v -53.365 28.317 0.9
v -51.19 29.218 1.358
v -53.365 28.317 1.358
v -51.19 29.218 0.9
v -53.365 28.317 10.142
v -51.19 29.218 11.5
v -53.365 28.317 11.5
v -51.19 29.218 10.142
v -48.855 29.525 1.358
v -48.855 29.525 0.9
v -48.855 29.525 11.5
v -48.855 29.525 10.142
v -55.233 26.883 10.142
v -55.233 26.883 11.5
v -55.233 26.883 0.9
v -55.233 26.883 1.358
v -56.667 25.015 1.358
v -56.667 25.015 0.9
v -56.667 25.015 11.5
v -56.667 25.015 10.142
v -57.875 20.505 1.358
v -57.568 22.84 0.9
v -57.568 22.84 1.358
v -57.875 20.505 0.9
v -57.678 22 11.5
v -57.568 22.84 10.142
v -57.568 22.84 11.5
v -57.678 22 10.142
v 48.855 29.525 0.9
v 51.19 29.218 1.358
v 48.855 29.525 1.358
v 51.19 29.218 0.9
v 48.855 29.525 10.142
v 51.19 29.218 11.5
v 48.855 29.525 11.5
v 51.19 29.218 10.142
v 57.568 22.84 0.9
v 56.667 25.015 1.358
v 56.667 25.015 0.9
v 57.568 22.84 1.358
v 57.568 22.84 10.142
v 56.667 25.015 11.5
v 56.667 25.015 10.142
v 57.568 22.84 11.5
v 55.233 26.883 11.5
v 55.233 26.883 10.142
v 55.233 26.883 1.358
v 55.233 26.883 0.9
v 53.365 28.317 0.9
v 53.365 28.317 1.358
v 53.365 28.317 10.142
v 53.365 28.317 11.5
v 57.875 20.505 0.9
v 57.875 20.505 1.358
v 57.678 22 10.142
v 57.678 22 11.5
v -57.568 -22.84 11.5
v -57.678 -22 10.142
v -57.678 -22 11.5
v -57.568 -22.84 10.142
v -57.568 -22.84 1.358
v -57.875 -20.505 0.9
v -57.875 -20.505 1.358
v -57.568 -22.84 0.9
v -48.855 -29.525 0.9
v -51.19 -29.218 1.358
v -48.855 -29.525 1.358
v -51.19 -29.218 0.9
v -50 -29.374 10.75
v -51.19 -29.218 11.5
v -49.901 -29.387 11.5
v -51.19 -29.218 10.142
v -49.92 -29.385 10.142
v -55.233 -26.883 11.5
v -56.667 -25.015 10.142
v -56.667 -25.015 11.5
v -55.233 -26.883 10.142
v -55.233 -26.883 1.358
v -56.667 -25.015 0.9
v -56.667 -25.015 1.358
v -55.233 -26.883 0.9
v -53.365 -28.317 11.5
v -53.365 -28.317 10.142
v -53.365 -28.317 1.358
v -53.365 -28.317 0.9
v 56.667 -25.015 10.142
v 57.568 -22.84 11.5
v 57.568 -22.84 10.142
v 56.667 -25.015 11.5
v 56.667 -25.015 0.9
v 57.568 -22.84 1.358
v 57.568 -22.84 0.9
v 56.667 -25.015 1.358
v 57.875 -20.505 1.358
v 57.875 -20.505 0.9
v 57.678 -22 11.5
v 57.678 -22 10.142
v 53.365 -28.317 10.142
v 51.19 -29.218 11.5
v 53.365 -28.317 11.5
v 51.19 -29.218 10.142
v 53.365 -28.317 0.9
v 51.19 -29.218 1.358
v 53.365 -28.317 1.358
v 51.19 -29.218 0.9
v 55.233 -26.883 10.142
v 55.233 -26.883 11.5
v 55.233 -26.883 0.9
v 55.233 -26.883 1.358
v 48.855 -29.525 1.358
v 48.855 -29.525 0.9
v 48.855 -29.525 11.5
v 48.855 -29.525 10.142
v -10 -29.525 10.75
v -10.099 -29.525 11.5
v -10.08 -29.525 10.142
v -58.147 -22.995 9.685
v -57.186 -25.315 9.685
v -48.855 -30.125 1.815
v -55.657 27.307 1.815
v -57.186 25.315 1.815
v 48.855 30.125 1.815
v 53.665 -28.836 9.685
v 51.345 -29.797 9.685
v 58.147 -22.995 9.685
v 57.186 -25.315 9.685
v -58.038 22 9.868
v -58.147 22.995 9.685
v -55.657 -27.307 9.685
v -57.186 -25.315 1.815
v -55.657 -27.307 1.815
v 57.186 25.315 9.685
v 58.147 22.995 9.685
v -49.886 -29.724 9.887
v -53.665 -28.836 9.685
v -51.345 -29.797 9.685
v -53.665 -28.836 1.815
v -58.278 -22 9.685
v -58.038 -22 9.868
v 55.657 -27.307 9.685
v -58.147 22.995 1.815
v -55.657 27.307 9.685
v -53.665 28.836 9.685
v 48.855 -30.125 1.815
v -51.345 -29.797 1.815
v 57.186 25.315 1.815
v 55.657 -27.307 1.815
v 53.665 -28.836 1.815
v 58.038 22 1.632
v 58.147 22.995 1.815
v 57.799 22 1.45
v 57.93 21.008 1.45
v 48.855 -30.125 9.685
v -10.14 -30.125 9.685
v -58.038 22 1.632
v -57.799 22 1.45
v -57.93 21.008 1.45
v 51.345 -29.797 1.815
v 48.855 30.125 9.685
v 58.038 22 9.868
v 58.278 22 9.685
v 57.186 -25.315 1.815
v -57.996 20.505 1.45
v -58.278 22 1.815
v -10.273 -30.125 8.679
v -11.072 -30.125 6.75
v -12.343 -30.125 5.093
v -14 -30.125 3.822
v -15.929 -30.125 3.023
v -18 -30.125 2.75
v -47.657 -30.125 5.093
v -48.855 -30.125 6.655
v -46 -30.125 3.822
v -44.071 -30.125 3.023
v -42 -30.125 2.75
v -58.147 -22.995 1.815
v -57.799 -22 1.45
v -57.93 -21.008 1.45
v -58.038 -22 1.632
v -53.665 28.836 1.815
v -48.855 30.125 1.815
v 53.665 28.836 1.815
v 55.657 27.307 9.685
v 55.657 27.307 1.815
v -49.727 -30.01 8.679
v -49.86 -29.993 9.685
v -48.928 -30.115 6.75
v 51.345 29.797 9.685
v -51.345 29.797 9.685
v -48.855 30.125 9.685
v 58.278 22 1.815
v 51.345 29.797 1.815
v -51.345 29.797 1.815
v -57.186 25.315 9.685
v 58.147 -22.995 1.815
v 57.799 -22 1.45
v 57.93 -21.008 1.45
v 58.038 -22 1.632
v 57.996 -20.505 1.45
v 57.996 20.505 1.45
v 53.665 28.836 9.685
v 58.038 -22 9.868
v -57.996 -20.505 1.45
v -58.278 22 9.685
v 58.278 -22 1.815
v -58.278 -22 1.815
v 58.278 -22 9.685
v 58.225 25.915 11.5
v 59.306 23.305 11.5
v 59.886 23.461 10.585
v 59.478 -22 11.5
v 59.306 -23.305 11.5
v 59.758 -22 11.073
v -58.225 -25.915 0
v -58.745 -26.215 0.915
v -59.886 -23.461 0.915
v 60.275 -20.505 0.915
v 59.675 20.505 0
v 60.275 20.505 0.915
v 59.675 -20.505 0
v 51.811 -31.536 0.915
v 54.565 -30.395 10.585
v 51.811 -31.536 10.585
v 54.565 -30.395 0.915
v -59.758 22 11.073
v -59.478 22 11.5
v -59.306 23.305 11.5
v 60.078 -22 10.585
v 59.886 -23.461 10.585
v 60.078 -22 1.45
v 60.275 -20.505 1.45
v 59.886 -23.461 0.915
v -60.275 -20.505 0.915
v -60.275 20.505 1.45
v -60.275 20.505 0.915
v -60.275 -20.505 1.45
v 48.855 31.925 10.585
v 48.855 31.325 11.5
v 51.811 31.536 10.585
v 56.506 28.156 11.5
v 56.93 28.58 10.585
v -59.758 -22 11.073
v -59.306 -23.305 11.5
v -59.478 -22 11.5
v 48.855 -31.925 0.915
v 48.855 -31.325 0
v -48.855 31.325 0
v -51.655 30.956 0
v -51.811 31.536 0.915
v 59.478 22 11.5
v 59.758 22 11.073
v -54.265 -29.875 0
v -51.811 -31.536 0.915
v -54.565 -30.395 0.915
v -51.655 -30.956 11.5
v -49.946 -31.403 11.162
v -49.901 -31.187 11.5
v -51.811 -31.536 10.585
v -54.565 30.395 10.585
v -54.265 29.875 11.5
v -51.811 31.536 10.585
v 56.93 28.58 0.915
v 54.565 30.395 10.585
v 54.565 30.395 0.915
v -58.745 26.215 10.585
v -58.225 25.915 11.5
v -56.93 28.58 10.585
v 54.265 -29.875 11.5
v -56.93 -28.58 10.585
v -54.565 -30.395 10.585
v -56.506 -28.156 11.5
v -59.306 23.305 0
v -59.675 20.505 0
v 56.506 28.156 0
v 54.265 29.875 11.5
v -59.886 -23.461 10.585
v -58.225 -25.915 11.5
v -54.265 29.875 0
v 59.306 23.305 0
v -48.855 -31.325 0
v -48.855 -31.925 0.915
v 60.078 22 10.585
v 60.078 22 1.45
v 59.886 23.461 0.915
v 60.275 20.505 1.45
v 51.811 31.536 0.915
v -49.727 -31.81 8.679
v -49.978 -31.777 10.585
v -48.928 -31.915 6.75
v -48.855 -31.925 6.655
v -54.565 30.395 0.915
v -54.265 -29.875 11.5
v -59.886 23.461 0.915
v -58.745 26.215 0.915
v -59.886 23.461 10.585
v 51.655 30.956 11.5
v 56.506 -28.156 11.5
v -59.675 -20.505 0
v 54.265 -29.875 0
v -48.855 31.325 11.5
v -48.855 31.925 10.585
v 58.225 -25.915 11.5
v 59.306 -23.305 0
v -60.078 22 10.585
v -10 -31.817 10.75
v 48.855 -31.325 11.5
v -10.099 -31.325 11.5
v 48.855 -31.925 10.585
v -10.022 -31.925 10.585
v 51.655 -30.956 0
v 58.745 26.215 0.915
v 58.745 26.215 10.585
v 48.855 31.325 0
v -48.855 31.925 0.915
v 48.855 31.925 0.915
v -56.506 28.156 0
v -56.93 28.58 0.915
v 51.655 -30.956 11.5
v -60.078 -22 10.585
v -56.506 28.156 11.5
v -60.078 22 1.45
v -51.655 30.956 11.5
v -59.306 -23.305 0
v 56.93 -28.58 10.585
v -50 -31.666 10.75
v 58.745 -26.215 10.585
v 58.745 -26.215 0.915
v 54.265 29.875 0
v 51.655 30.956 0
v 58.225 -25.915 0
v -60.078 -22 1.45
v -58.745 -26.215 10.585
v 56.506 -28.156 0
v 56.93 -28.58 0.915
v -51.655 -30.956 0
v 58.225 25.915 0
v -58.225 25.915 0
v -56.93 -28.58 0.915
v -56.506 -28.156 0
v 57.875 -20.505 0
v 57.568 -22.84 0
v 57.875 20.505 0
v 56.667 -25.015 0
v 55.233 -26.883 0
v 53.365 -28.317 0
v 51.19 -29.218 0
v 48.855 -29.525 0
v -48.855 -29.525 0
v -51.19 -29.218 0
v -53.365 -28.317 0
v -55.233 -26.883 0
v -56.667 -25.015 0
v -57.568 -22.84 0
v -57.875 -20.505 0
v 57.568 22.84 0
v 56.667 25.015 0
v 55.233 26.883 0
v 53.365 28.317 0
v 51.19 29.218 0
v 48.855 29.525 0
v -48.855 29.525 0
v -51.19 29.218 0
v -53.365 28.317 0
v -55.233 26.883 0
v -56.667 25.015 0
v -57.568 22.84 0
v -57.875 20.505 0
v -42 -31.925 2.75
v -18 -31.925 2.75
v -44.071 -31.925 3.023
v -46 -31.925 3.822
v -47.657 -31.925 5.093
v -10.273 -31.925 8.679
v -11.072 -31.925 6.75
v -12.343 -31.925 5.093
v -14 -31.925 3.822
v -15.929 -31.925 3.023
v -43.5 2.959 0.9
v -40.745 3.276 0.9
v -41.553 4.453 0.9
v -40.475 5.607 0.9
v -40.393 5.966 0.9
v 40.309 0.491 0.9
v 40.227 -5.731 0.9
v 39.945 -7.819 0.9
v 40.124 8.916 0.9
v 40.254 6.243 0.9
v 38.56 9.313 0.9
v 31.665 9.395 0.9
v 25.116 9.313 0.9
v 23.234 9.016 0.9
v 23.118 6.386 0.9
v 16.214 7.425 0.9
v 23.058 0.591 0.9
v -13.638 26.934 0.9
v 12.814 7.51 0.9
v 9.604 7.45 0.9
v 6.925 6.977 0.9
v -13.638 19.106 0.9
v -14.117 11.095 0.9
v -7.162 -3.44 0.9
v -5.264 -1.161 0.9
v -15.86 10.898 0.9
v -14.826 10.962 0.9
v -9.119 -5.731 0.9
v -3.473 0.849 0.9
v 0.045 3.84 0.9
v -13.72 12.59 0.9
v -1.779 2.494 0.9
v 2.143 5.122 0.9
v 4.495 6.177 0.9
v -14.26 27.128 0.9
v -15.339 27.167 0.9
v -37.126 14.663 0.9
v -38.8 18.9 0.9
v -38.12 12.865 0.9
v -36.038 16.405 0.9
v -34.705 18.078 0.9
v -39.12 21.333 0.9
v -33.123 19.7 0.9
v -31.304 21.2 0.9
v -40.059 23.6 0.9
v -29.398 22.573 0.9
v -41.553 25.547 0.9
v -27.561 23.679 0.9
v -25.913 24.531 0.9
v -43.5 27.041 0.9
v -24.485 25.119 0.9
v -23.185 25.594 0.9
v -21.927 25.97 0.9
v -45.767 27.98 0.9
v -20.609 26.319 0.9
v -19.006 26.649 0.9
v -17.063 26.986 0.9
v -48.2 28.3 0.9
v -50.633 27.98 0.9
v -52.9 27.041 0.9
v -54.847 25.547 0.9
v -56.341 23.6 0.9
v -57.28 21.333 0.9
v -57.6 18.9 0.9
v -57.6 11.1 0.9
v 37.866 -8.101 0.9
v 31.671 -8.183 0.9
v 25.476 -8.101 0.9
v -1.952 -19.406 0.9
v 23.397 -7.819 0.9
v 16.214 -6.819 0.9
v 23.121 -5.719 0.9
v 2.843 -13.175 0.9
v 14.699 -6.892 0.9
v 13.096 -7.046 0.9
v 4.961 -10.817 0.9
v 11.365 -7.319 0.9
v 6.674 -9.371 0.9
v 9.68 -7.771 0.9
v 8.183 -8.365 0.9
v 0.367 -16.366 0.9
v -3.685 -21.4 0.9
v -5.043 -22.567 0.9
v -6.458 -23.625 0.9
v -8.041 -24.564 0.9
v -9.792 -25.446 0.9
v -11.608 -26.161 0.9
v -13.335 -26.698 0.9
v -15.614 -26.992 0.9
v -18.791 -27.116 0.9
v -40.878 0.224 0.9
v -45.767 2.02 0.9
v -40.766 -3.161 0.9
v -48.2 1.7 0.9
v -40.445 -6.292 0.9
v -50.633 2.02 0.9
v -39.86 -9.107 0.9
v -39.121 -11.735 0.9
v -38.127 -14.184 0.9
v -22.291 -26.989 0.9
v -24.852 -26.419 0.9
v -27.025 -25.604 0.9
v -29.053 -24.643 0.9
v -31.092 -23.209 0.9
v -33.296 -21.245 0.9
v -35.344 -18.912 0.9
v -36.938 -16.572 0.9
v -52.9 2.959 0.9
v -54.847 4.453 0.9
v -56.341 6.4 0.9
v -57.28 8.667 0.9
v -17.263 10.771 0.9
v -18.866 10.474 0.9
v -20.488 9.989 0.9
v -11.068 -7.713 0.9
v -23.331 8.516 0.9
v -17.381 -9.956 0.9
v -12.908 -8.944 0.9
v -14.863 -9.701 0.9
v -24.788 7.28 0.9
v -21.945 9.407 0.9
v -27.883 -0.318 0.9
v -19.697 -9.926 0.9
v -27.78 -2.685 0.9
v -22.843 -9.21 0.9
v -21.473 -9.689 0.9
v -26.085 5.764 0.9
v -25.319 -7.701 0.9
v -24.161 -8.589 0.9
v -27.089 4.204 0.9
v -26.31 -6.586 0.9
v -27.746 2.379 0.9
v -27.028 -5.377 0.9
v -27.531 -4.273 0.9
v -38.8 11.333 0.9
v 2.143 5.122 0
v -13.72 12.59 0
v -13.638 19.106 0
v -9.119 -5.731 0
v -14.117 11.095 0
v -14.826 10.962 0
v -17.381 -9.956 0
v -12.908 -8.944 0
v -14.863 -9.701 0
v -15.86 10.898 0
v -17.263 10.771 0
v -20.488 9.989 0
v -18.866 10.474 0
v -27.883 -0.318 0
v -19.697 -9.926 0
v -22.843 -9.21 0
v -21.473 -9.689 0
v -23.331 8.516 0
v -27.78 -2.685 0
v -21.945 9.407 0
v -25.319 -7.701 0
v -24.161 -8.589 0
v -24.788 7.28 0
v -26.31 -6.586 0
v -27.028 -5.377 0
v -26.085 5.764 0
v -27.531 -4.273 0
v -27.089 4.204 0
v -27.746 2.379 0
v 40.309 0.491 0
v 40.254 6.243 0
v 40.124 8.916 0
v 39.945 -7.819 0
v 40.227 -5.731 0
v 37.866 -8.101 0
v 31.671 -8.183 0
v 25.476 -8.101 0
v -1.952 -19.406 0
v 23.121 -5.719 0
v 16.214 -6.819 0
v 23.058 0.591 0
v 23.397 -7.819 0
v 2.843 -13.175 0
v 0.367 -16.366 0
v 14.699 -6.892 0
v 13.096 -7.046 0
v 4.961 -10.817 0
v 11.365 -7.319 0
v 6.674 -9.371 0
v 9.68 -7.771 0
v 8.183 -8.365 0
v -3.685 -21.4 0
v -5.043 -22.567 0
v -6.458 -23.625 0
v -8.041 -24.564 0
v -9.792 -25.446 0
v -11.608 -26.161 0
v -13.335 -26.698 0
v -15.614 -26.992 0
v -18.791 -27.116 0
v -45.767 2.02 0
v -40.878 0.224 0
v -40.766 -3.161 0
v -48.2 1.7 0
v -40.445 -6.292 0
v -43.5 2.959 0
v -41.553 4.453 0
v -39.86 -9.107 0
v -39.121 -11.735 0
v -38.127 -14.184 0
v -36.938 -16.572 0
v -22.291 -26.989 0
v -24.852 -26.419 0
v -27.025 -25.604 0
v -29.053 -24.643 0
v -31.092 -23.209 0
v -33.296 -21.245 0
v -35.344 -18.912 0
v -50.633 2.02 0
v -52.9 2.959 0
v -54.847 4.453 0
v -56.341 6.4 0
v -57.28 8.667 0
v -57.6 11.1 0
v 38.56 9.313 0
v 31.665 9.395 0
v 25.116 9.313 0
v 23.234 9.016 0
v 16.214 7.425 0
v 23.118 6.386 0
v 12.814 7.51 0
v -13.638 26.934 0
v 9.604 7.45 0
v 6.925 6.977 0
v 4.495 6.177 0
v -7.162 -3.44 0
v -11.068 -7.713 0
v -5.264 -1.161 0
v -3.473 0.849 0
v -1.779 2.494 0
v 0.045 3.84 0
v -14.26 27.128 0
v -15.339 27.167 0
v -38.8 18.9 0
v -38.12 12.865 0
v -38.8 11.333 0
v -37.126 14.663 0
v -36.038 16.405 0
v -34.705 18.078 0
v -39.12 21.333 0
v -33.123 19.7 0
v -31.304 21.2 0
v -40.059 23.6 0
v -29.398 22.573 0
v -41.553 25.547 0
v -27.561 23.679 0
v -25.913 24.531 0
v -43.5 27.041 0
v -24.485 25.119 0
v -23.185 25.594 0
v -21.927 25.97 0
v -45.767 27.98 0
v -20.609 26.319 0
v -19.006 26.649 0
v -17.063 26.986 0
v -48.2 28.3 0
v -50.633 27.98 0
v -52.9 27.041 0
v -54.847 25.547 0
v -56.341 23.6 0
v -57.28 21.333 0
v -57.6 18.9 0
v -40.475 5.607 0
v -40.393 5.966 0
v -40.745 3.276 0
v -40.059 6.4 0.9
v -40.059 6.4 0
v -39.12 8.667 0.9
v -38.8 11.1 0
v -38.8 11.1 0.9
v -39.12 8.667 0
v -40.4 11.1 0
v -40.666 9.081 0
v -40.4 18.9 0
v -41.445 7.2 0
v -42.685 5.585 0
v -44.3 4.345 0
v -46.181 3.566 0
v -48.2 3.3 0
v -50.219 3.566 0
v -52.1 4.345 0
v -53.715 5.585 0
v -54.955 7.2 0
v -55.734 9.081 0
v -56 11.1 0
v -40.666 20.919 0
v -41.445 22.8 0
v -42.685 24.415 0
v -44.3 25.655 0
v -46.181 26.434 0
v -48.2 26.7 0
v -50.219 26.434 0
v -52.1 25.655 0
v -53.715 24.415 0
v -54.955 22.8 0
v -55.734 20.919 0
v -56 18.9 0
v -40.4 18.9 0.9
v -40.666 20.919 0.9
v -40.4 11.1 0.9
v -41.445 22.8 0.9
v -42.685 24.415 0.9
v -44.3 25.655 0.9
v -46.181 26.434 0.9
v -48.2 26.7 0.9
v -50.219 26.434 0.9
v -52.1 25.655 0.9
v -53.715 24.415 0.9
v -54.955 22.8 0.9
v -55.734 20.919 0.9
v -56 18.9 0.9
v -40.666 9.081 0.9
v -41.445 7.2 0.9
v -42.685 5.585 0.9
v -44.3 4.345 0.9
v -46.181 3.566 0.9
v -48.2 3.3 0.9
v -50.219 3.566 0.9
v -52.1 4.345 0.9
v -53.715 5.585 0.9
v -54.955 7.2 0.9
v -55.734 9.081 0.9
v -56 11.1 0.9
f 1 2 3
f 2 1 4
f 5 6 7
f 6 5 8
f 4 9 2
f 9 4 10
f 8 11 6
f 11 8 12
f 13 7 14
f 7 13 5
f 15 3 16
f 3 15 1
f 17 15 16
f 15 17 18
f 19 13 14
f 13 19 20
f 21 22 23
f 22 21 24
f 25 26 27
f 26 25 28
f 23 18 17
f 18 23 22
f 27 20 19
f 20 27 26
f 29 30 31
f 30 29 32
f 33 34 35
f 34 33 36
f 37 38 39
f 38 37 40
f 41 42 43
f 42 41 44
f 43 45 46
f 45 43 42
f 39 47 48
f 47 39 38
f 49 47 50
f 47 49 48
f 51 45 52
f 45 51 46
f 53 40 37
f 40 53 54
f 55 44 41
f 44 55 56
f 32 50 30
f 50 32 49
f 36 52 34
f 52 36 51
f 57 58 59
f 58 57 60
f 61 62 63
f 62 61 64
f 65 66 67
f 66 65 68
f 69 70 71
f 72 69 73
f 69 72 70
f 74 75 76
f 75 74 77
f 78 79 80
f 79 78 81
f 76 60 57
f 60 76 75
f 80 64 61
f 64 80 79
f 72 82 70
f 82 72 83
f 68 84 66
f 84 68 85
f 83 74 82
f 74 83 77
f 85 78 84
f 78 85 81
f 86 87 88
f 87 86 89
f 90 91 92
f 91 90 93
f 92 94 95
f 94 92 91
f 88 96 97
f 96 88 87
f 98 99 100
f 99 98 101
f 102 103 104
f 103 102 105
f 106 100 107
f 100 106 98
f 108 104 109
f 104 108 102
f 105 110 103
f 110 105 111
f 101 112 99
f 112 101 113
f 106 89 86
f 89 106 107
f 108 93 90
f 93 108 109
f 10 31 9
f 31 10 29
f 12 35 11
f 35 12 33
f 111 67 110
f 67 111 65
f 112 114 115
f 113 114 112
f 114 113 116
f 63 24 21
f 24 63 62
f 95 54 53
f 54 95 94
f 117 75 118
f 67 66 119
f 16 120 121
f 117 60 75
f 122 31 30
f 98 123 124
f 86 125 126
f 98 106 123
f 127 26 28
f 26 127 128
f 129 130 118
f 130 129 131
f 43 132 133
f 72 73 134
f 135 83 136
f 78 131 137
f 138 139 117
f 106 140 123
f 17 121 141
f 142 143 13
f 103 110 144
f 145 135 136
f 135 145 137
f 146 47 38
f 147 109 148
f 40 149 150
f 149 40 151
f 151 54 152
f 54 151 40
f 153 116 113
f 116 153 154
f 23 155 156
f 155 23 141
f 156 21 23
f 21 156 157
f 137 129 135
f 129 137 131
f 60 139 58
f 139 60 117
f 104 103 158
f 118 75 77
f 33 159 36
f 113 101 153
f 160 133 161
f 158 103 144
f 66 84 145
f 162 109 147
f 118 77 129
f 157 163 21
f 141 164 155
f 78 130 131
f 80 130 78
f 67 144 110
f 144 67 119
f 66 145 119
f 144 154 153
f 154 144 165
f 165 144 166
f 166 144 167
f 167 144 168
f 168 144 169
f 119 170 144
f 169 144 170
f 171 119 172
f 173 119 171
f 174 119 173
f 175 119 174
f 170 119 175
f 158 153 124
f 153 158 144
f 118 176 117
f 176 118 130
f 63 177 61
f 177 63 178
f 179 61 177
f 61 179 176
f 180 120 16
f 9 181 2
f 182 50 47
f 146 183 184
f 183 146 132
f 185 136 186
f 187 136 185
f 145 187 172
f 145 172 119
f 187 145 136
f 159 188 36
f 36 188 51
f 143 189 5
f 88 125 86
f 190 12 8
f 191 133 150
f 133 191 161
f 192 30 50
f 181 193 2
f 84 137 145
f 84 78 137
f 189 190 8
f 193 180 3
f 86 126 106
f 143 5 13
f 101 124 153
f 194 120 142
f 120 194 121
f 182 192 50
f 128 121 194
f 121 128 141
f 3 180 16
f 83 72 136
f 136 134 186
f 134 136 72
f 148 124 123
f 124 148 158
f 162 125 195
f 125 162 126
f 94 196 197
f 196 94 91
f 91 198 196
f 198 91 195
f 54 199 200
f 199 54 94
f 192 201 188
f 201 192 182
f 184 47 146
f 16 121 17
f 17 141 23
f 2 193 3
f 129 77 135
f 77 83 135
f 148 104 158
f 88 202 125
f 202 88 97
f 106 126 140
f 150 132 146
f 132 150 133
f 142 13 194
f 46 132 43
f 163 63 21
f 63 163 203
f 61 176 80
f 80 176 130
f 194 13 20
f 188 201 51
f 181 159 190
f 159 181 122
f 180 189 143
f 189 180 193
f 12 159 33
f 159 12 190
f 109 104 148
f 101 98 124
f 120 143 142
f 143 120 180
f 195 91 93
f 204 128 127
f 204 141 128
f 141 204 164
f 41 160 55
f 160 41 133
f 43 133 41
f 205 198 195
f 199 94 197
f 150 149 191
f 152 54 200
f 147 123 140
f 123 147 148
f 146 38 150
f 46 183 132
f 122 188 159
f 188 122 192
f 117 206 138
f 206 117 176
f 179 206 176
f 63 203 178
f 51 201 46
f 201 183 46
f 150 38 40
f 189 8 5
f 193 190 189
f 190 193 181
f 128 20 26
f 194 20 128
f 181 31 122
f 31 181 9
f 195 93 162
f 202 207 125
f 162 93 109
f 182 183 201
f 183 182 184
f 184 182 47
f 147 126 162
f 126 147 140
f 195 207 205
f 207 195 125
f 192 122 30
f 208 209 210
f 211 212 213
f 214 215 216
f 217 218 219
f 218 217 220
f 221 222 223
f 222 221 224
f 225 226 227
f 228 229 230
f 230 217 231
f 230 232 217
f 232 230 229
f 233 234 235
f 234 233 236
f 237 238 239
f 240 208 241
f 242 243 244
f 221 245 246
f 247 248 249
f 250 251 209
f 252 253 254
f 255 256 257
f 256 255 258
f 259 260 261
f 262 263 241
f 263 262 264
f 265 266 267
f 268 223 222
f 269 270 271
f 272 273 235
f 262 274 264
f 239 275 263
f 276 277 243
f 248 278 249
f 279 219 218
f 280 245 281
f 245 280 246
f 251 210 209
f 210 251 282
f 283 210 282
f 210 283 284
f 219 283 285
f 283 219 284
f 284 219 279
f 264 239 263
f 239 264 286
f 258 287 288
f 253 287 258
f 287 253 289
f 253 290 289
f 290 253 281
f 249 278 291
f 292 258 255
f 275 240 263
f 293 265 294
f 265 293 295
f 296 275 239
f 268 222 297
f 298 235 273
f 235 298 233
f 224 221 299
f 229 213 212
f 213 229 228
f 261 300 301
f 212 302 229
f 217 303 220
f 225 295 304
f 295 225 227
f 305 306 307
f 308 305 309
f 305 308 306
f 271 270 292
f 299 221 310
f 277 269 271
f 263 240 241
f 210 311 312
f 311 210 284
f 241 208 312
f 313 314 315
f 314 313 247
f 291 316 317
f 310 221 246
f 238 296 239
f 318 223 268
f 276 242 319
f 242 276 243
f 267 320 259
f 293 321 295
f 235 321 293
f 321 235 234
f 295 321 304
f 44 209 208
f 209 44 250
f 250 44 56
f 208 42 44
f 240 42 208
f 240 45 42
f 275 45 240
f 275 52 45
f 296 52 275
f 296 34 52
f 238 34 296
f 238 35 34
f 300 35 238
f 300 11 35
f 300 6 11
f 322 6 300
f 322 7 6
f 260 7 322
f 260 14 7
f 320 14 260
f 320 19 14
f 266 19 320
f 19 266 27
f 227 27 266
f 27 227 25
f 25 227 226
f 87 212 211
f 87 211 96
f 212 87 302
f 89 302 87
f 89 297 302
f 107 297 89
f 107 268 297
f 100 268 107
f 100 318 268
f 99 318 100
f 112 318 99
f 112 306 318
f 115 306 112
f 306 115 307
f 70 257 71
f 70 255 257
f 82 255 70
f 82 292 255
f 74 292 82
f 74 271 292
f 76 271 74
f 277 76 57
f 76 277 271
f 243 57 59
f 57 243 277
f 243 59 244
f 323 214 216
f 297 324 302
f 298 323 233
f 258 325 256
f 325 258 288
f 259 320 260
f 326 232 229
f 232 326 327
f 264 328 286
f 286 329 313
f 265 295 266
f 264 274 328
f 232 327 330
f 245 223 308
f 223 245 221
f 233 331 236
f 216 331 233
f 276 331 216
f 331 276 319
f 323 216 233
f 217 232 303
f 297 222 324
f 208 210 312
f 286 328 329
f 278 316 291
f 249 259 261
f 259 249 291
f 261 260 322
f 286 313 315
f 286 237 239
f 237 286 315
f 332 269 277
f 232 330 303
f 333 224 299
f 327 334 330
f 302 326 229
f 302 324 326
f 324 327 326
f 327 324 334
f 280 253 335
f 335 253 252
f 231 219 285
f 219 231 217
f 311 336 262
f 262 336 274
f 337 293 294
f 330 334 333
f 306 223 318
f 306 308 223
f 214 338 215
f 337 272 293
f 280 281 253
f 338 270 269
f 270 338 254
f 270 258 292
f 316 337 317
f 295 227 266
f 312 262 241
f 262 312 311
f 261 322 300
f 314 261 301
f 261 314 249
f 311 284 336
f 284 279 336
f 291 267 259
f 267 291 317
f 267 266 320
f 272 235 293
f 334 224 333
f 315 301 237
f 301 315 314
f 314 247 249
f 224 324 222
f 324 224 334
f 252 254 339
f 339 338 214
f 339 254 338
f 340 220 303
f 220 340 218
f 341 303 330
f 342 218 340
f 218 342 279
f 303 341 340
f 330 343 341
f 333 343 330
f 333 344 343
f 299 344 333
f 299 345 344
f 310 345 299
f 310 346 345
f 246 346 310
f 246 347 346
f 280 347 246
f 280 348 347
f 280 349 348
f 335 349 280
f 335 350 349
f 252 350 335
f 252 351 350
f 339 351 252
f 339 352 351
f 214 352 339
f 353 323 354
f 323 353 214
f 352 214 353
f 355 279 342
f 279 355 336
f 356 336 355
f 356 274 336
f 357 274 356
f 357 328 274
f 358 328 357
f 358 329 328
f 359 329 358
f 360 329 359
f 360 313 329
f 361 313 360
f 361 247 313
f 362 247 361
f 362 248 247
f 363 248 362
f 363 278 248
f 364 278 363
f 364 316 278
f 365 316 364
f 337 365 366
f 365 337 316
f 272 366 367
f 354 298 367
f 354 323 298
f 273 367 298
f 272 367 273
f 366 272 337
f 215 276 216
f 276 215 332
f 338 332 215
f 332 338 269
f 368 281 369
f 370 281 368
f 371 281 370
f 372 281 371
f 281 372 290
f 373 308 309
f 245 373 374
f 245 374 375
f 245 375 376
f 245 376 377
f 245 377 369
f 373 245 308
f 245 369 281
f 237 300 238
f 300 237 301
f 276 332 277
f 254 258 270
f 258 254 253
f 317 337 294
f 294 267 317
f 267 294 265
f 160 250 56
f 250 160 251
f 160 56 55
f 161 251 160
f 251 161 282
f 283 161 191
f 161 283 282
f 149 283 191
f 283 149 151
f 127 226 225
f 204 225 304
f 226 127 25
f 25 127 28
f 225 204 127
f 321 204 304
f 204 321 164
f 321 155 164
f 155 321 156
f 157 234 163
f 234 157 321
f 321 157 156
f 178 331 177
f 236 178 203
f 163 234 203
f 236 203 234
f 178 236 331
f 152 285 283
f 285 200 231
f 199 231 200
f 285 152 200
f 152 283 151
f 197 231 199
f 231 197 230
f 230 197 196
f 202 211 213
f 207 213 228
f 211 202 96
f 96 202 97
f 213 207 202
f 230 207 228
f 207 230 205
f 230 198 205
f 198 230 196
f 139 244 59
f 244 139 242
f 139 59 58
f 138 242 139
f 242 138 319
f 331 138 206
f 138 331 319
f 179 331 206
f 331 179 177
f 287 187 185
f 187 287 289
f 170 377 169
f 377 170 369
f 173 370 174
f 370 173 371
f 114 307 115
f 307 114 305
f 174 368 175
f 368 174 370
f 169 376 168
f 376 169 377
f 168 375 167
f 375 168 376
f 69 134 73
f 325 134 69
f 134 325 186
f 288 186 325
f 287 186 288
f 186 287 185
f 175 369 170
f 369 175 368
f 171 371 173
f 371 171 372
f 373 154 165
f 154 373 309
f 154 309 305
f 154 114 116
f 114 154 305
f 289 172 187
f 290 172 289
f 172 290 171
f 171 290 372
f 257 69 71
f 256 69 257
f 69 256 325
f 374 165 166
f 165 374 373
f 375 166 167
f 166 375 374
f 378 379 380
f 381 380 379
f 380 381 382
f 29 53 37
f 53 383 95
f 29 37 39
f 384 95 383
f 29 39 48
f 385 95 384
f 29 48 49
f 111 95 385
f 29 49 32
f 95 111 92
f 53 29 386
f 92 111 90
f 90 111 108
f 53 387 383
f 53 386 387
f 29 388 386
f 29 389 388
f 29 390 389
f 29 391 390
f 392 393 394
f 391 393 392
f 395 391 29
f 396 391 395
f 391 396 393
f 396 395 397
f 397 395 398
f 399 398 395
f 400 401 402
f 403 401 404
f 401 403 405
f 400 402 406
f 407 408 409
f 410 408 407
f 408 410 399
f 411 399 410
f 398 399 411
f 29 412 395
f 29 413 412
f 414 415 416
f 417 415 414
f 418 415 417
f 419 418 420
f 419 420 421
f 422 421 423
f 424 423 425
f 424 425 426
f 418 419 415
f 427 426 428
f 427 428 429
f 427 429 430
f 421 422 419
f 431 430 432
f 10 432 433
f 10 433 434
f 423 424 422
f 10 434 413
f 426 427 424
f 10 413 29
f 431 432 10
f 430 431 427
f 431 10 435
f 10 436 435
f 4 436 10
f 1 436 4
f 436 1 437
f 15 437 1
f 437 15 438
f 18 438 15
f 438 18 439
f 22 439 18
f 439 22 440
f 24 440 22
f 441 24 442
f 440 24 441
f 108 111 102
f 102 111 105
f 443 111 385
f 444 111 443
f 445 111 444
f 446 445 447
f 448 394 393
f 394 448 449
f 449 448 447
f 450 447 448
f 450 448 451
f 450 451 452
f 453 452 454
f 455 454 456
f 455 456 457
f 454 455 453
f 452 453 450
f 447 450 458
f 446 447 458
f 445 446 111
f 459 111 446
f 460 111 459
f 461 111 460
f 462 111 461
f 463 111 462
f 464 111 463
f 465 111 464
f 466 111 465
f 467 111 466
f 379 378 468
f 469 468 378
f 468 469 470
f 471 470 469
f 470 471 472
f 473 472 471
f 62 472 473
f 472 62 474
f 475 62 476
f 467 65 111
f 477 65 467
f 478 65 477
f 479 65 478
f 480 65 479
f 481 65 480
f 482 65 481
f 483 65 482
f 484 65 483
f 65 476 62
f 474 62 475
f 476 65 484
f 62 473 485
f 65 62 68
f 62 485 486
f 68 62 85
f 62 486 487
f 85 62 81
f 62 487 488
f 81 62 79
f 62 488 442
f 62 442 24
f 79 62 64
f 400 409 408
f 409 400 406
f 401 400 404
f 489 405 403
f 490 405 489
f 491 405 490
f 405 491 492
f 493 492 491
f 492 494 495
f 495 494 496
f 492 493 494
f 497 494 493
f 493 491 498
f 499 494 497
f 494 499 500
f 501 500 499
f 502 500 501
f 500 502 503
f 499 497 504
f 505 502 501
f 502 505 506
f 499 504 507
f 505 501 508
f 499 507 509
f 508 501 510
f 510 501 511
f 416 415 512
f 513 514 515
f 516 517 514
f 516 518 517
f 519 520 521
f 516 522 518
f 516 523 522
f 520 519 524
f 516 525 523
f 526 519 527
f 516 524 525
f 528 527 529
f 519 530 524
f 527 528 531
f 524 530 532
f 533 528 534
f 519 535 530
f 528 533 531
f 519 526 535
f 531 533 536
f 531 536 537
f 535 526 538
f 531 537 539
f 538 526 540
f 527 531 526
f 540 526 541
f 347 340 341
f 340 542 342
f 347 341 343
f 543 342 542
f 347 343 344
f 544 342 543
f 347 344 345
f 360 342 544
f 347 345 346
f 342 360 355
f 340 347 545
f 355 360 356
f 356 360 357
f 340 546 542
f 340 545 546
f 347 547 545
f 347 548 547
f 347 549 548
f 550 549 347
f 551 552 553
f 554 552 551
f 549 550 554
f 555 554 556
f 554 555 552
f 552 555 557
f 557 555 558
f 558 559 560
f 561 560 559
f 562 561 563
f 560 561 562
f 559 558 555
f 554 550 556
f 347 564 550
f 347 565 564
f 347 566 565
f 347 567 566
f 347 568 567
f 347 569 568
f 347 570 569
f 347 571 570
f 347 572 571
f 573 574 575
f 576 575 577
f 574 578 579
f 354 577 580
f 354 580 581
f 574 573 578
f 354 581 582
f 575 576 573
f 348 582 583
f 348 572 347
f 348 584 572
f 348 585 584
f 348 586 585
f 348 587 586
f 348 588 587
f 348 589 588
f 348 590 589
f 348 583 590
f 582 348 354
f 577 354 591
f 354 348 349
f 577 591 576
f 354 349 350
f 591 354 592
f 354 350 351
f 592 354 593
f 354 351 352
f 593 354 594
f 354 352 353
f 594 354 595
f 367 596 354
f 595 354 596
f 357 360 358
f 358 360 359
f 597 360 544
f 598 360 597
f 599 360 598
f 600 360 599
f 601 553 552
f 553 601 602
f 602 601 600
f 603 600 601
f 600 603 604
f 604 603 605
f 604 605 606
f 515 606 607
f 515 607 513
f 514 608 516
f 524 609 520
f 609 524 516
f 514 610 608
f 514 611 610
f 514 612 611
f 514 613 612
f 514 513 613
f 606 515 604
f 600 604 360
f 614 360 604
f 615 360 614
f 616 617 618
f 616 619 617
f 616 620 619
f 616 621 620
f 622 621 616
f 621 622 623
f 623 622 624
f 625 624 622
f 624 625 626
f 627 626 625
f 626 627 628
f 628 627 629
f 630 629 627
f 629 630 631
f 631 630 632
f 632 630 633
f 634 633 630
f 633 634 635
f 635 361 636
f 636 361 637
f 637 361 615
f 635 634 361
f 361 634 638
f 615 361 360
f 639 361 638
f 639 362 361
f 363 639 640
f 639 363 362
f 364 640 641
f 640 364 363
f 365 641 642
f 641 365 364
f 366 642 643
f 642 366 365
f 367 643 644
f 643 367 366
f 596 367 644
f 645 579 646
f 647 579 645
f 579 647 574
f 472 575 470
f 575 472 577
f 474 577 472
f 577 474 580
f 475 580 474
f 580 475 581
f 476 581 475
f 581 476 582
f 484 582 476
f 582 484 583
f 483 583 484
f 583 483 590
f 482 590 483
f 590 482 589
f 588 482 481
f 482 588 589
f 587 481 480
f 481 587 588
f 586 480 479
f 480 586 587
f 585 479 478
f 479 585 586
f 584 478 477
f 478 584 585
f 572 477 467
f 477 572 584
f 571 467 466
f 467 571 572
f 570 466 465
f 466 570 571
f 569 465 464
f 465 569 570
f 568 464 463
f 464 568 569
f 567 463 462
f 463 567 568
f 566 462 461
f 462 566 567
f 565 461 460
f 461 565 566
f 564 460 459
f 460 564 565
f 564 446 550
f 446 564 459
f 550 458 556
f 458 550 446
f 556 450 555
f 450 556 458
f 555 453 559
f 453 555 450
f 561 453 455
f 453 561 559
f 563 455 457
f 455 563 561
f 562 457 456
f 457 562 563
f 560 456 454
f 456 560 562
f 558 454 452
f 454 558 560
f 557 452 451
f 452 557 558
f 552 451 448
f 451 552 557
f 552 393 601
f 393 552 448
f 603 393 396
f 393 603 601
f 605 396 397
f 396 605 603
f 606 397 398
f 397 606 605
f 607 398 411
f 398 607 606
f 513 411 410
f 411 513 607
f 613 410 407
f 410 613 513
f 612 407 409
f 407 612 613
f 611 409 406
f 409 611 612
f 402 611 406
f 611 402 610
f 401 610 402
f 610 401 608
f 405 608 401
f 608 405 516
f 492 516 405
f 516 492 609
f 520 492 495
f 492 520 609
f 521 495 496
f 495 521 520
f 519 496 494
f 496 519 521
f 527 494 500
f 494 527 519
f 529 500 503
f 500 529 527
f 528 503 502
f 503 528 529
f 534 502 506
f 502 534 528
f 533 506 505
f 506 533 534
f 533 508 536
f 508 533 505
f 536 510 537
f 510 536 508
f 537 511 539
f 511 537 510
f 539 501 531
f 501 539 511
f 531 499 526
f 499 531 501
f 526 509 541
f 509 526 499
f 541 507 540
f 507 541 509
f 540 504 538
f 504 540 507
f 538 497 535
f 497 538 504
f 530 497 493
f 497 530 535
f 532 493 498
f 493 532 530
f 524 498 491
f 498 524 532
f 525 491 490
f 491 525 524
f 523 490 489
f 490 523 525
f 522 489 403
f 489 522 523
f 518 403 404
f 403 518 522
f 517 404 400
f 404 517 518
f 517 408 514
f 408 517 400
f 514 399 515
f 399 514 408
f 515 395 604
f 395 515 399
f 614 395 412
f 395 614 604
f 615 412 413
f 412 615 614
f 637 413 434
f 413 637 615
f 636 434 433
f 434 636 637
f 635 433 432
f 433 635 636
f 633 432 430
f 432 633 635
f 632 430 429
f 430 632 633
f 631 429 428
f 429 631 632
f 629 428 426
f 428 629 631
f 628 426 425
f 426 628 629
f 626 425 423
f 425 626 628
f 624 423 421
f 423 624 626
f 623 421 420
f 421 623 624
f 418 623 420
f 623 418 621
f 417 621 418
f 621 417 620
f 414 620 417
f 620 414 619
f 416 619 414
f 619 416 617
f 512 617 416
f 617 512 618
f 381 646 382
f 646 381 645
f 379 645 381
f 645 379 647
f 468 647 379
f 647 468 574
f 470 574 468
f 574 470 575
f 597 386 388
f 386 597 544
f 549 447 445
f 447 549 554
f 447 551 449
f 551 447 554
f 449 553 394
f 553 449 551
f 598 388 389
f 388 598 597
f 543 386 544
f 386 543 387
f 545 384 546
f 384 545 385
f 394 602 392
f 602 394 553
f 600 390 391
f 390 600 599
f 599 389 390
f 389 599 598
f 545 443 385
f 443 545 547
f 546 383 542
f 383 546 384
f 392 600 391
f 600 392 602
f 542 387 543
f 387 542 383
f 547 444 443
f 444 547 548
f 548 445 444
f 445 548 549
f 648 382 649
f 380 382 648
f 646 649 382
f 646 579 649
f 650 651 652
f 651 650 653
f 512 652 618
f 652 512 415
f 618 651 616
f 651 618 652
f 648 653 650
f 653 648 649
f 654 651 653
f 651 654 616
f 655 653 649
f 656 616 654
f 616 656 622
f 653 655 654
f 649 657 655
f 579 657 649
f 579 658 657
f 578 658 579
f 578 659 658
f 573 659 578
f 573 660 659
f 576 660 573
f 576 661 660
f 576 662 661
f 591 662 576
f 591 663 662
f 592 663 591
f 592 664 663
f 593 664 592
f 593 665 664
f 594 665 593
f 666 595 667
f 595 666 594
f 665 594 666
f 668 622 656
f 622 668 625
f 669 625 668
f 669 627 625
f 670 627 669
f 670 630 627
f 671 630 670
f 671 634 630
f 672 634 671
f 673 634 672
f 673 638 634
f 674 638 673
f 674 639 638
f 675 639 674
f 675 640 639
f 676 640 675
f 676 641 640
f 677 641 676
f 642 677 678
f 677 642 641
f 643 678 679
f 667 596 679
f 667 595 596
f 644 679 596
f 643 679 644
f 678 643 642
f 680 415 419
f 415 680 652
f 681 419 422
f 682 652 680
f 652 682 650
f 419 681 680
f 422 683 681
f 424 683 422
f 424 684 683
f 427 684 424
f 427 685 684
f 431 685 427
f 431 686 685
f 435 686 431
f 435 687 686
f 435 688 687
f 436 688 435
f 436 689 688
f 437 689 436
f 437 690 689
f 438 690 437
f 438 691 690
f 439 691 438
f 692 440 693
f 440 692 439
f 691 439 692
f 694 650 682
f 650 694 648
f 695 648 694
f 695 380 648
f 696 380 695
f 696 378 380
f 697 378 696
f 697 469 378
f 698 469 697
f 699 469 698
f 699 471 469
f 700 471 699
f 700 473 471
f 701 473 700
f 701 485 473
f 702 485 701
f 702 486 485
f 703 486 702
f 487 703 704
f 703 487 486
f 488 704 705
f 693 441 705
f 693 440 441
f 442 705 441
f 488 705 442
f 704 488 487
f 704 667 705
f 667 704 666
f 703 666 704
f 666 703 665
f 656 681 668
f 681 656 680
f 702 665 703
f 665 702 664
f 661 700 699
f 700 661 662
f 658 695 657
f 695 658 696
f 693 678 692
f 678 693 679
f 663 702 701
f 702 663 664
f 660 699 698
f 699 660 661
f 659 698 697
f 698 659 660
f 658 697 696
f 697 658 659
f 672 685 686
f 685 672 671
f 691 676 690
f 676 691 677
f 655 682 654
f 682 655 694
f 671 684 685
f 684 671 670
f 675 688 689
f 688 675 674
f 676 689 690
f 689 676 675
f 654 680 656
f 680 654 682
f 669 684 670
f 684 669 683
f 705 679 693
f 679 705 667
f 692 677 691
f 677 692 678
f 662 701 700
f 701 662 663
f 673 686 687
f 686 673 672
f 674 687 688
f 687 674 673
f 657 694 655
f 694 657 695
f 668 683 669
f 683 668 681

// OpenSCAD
//preview[view:west,tilt:bottom]

////////////////////////////////////////////////////////////////////////////////////////////
///////////////////          *Customizer variables*          ////////////////////////
////////////////////////////////////////////////////////////////////////////////////////////

iphone_version = 1; //[1:iPhone 4,1:iPhone 4S,2:iPhone 5]
case_thickness = 1.8; //[1.8:Slim,2.4:Sturdy]
type_of_case = 1; //[1:Stencil,2:Makerbot Geometric Design]

//For Stencil: Paste here after "Convert&Copy"
input ="no_input";

//For Stencil: If you want to scale your image to less or more than 100% width
image_scale=100;//[10:500]

//For Stencil: If you don't want to center your design on the case
offX = 0;
offY = 0;

//For MB Geometrics: Select the pattern shape
pattern_shape = 6; //[3:Triangle (3-sided),4:Square (4-sided),5:Pentagon (5-sided),6:Hexagon (6-sided),7:Heptagon (7-sided),8:Octogon (8-sided),9:Nonagon (9-sided),10:Decagon (10-sided),11:Hendecagon (11-sided),12:Dodecagon (12-sided),30:Circle (30-sided)]

//For MB Geometrics: in mm:
pattern_radius = 8; //[4:22]
pattern_overlap = 15; //[0:100]

//For MB Geometrics: in degrees:
pattern_rotation = 0; //[0:180]

//For MB Geometrics: in .4 mm increments:
pattern_thickness = 2; //[2:30]

//Use these variables in case you need to adjust the case tolerance for fit
perimeter_tolerance=.85;
height_tolerance=.1;

////////////////////////////////////////////////////////////////////////////////////////////
///////////////////          *Non customizer variables*          ////////////////////////
////////////////////////////////////////////////////////////////////////////////////////////

module Void(){}

honeycomb_radius = pattern_radius;
honeycomb_radius_modifier = pattern_overlap;
honeycomb_sides = pattern_shape;
honeycomb_rotation = pattern_rotation;
line_thickness = pattern_thickness;
honeycomb_thickness = line_thickness*.4;

stencil_thickness = 10;

cthk = case_thickness;
ctol = perimeter_tolerance;
htol = height_tolerance;

4width=58.55;	
4length=115.25;
4height=9.5;
4cornerR = 8.77;
4swidth=6.17;
4sthick=.6;
4margin=4width/2-(4width/2-3)*image_scale/100;

5width = 58.57;
5length = 123.83;
5height = 7.6;
5cornerR = 9.28;
5sthick = 1.0;
5swidth = 5height - 5sthick*1.5;
5margin=5width/2-(5width/2-3)*image_scale/100;


heightvar=.24;

homebuttonR = 5.6;
homebuttonD = homebuttonR*2;



top_bottom_opening_width = 50;

leftholelength = 25.43;
leftholeR = 2.4;
topholelength = 38.57;
topholeR = 2.5;
bottomholelength1 = 43.97;
bottomholelength2 = 26.05;
bottombigR = 1.53;
bottomsmallR = 1.15;

corner_resolution = 6;
circle_resolution = corner_resolution*4;



fudge = .05;

rotate([0,0,90]){
	if(type_of_case==1){
		if(iphone_version == 1){
			iPhone4StencilCase();
		}else{
			iPhone5StencilCase();
		}
	}
	if(type_of_case==2){
		if(iphone_version == 1){
			iPhone4MBCase();
		}else{
			iPhone5MBCase();
		}
	}	
}


module iPhoneGlass(	w,		//width
				l,		//length
				h,		//height
				r,		//corner radius
				st)   {	//strip thickness


	wi=w-2*st;
	li=l-2*st;
	ri=r-st;

	union(){

		cube([wi,li-ri*2,h],center = true);

		cube([wi-ri*2,li,h],center = true);

		for(i=[1,-1]){
			for(j=[1,-1]){
				translate([i*(wi/2-ri),j*(li/2-ri),0])
					cylinder(	h = h,
							r = ri,
							center = true,
							$fn = circle_resolution);
			}
		}
	}
}

module iPhoneStrip(	w,		//width
				l,		//length
				h,		//height
				r,		//corner radius
				st	) {	//strip thickness
						
	union(){
		
		cube([w,l-r*2,h],center = true);

		cube([w-r*2,l,h],center = true);

		for(i=[1,-1]){
			for(j=[1,-1]){
				translate([i*(w/2-r),j*(l/2-r),0])
		
					cylinder(	h = h,
								r = r,
								center = true,
								$fn = circle_resolution);
			}
		}
	}
}

module iPhoneCameraHole(w,h,r){
	hull(){
		translate([w/2,0,0])
			cylinder(h = h,r = r,center = true, $fn = circle_resolution);
		translate([-w/2,0,0])
			cylinder(h = h,r = r,center = true, $fn = circle_resolution);
	}
}


module iPhone5(w,l,h,cR,sw,st){
	hull(){
		iPhoneGlass(w,l,h,cR,st);
		iPhoneStrip(w,l,sw,cR,st);
	}
}


module iPhone4(w,l,h,cR,sw,st){
	union(){
		hull(){
			iPhoneGlass(w,l,sw+(h-sw)/2,cR,st);
			iPhoneStrip(w,l,sw,cR,st);
		}
		iPhoneGlass(w,l,h,cR,st);
	}
}

module iPhone5StencilCase(){
	translate([0,0,(5height+cthk+2*htol)/2]){
		difference(){
			iPhone5(w=5width+2*(cthk+ctol),
					l=5length+2*(cthk+ctol),
					h=5height+cthk+2*htol,
					cR=5cornerR+cthk+ctol,
					sw=5swidth+cthk+2*ctol,
					st=5sthick);

			iPhone5(w=5width+2*ctol,
					l=5length+2*ctol,
					h=5height+2*htol,
					cR=5cornerR+ctol,
					sw=5swidth+2*ctol,
					st=5sthick);

			scale([1,1,2])iPhoneGlass(w=5width+2*ctol,
					l=5length+2*ctol,
					h=5height+2*htol,
					r=5cornerR+ctol,
					st=5sthick);

			translate([0,0,cthk/2])
				cube([44,5length+20,5height+cthk/2],center = true);
			
			translate([-5width/2-cthk*.8,30,4.5])
				rotate([90,0,90])
				scale([1,1,2])
				iPhoneCameraHole(30,cthk*2,8);
		}
		difference(){
			union(){
				intersection(){
					translate([0,0,-(5height/2 + cthk/4 + htol)])
						iPhoneGlass(w=5width+2*ctol+fudge,
							l=5length+2*ctol+fudge,
							h=cthk/2,
							r=5cornerR+ctol-fudge,
							st=5sthick);
	
					scale([-1,1,5])
						stencil(5width+2*ctol,5length+2*ctol,5margin);
	
				}
				translate([15,52.4,-(5height/2 + cthk/4+htol)])
					iPhoneCameraHole(7.8,cthk/2,7.8+1.6);
			}
			translate([15,52.4,-(5height/2 + cthk/4+htol)])
				scale([1,1,2])
				iPhoneCameraHole(7.8,cthk/2,7.8);
	
	
		}
	}	
}


module iPhone4StencilCase(){
	translate([0,0,(4height+cthk+2*htol)/2]){
		difference(){
			iPhone5(w=4width+2*(cthk+ctol),
					l=4length+2*(cthk+ctol),
					h=4height+cthk+2*htol,
					cR=4cornerR+cthk+ctol,
					sw=4swidth+cthk+2*ctol,
					st=4sthick);

			iPhone4(w=4width+2*ctol,
					l=4length+2*ctol,
					h=4height+2*htol,
					cR=4cornerR+ctol,
					sw=4swidth+2*ctol,
					st=4sthick);

			scale([1,1,2])iPhoneGlass(w=4width+2*ctol,
					l=4length+2*ctol,
					h=4height+2*htol,
					r=4cornerR+ctol,
					st=4sthick);

			translate([0,0,cthk/2])
				cube([44,4length+20,4height+cthk/2],center = true);
			
			translate([-4width/2-cthk*.8,30,5])
				rotate([90,0,90])
				scale([1,1,2])
				iPhoneCameraHole(24,cthk*2,8);
		}
		difference(){
			union(){
				intersection(){
					translate([0,0,-(4height/2 + cthk/4 + htol)])
						iPhoneGlass(w=4width+2*ctol+fudge,
							l=4length+2*ctol+fudge,
							h=cthk/2,
							r=4cornerR+ctol-fudge,
							st=4sthick);
	
					scale([-1,1,5])
						stencil(4width+2*ctol,4length+2*ctol,4margin);
	
				}
				translate([15,48.2,-(4height/2 + cthk/4+htol)])
					iPhoneCameraHole(7.8,cthk/2,7.8+1.6);
			}
			translate([15,48.2,-(4height/2 + cthk/4+htol)])
				scale([1,1,2])
				iPhoneCameraHole(7.8,cthk/2,7.8);
	
	
		}
	}	
}


module iPhone5MBCase(){
	translate([0,0,(5height+cthk+2*htol)/2]){
		difference(){
			iPhone5(w=5width+2*(cthk+ctol),
					l=5length+2*(cthk+ctol),
					h=5height+cthk+2*htol,
					cR=5cornerR+cthk+ctol,
					sw=5swidth+cthk+2*ctol,
					st=5sthick);

			iPhone5(w=5width+2*ctol,
					l=5length+2*ctol,
					h=5height+2*htol,
					cR=5cornerR+ctol,
					sw=5swidth+2*ctol,
					st=5sthick);

			scale([1,1,2])iPhoneGlass(w=5width+2*ctol,
					l=5length+2*ctol,
					h=5height+2*htol,
					r=5cornerR+ctol,
					st=5sthick);

			translate([0,0,cthk/2])
				cube([44,5length+20,5height+cthk/2],center = true);
			
			translate([-5width/2-cthk*.8,30,4.5])
				rotate([90,0,90])
				scale([1,1,2])
				iPhoneCameraHole(30,cthk*2,8);
		}
		difference(){
			union(){
				translate([0,0,-(5height/2 + cthk/4 + htol)])intersection(){
					iPhoneGlass(w=5width+2*ctol+fudge,
							l=5length+2*ctol+fudge,
							h=cthk/2,
							r=5cornerR+ctol-fudge,
							st=5sthick);
	
					scale([-1,1,5])
						honeycomb(5width+2*ctol,5length+2*ctol,5height,honeycomb_radius,honeycomb_radius_modifier,honeycomb_thickness,honeycomb_sides);
	
				}
				translate([15,52.4,-(5height/2 + cthk/4+htol)])
					iPhoneCameraHole(7.8,cthk/2,7.8+1.6);
			}
			translate([15,52.4,-(5height/2 + cthk/4+htol)])
				scale([1,1,2])
				iPhoneCameraHole(7.8,cthk/2,7.8);
	
	
		}
	}	
}


module iPhone4MBCase(){
	translate([0,0,(4height+cthk+2*htol)/2]){
		difference(){
			iPhone5(w=4width+2*(cthk+ctol),
					l=4length+2*(cthk+ctol),
					h=4height+cthk+2*htol,
					cR=4cornerR+cthk+ctol,
					sw=4swidth+cthk+2*ctol,
					st=4sthick);

			iPhone4(w=4width+2*ctol,
					l=4length+2*ctol,
					h=4height+2*htol,
					cR=4cornerR+ctol,
					sw=4swidth+2*ctol,
					st=4sthick);

			scale([1,1,2])iPhoneGlass(w=4width+2*ctol,
					l=4length+2*ctol,
					h=4height+2*htol,
					r=4cornerR+ctol,
					st=4sthick);

			translate([0,0,cthk/2])
				cube([44,4length+20,4height+cthk/2],center = true);
			
			translate([-4width/2-cthk*.8,30,5])
				rotate([90,0,90])
				scale([1,1,2])
				iPhoneCameraHole(24,cthk*2,8);
		}
		difference(){
			union(){
				translate([0,0,-(4height/2 + cthk/4 + htol)])intersection(){
						iPhoneGlass(w=4width+2*ctol+fudge,
							l=4length+2*ctol+fudge,
							h=cthk/2,
							r=4cornerR+ctol-fudge,
							st=4sthick);
	
						scale([-1,1,5])
							honeycomb(4width+2*ctol,4length+2*ctol,4height,honeycomb_radius,honeycomb_radius_modifier,honeycomb_thickness,honeycomb_sides);
	
				}
				translate([15,48.2,-(4height/2 + cthk/4+htol)])
					iPhoneCameraHole(7.8,cthk/2,7.8+1.6);
			}
			translate([15,48.2,-(4height/2 + cthk/4+htol)])
				scale([1,1,2])
				iPhoneCameraHole(7.8,cthk/2,7.8);
	
	
		}
	}	
}




module stencil(stencil_width,stencil_height,margin){

	dispo_width = stencil_width - 2*margin;
	
	points_array = (input=="no_input"? [[179,268],[[199.26,15.12],[189.19,15.56],[181.5,16.45],[175.52,17.83],[169.55,19.42],[163.57,21.55],[157.55,24.22],[151.62,27.5],[145.87,31.09],[140.35,35.49],[135,40.71],[130.05,46.71],[125.52,53],[121.87,59.06],[119.06,64.5],[117.12,69.21],[115.55,73.5],[114.31,77.65],[113.16,82],[112.07,87.29],[110.96,93.7],[110.36,99.39],[110.49,102.95],[111.13,105],[136.96,105],[158.46,104.73],[163.39,103.42],[163.83,101.08],[164.04,97.67],[164.46,93.04],[165.44,87.75],[167.04,82.4],[168.96,77.59],[171.9,73.02],[175.98,68.21],[180.98,63.93],[186.13,60.62],[192.15,58.45],[201.05,58],[208.86,58.34],[214.1,59.16],[217.74,60.82],[221.73,63.19],[225.41,66.46],[228.34,70.28],[230.39,74.63],[231.97,79.15],[232.75,85.01],[232.85,92.65],[232.01,100.96],[229.51,107.41],[225.45,113.48],[218.91,119.91],[211.35,126.37],[203.83,132.63],[197.2,138.54],[191.77,144.13],[187.33,150.15],[183.1,157.07],[179.62,164.83],[176.98,172.85],[175.42,181.69],[175.22,192.28],[175.5,203.5],[199,203.5],[222.5,203.5],[222.74,198.5],[223.25,193.21],[224.15,187.5],[225.64,181.94],[227.6,177],[230.92,172.02],[235.69,166.37],[243.47,159.38],[254,151.21],[264.03,143.56],[270.61,137.84],[274.46,133.36],[277.95,128.69],[281.05,123.47],[283.96,117.69],[286.32,111.7],[288.09,106],[289.06,98.48],[289.47,88],[289.05,76.45],[287.17,68],[284.48,60.83],[281.31,54.14],[276.58,47.41],[270.1,40.14],[262.4,33.38],[254.68,28.12],[246.8,24.2],[238.72,20.92],[230.05,18.48],[220.76,16.55],[210.43,15.49],[199.26,15.12]],[[198.05,226.08],[178.93,226.28],[170.25,226.66],[169.27,232.87],[169,254.48],[169.27,277.23],[170.58,282.39],[179.4,282.82],[198.38,283],[218.91,282.73],[225.8,281.8],[226.73,274.94],[227,254.5],[226.73,234.06],[225.8,227.2],[218.87,226.29],[198.05,226.08]]]: input);
	
	input_width = points_array[0][0];
	input_height= points_array[0][1];
	sTrace = dispo_width/input_width;
	//stencil_height = input_height*sTrace + 2*margin;
	
	difference() {
		translate([0, 0, stencil_thickness/2])
		cube([stencil_width, stencil_height,3* stencil_thickness], center=true);
		translate([offX, offY, -stencil_thickness/2])
		scale([sTrace, -sTrace, 1])
		translate([-200, -150, 0]) {
			union() {
				for (i = [1:len(points_array) -1] ) {
					linear_extrude(height=stencil_thickness*2) {polygon(points_array[i]);}
				}
			}
		}
	}
}



module honeycomb(w,l,h,r,rmod,th,sides){
	
	columns = l/(r*3)+1;
	rows = w/(r*sqrt(3)/2*2);

	translate([-w/2,l/2,0])
		rotate([0,0,-90])
			for(i = [0:rows]){
				
				translate([0,r*sqrt(3)/2*i*2,0])
				//scale([1*(1+(i/10)),1,1])
					for(i = [0:columns]){
						translate([r*i*3,0,0])
							for(i = [0:1]){
								translate([r*1.5*i,r*sqrt(3)/2*i,0])
									rotate([0,0,honeycomb_rotation])
									difference(){
										if(sides < 5){
											cylinder(height = h, r = r+th+(r*rmod/50), center = true, $fn = sides);
										} else {
											cylinder(height = h, r = r+(r*rmod/50), center = true, $fn = sides);
										}
										cylinder(height = h+1, r = r-th+(r*rmod/50), center = true, $fn = sides);
									}
							}
					}
			}
}
